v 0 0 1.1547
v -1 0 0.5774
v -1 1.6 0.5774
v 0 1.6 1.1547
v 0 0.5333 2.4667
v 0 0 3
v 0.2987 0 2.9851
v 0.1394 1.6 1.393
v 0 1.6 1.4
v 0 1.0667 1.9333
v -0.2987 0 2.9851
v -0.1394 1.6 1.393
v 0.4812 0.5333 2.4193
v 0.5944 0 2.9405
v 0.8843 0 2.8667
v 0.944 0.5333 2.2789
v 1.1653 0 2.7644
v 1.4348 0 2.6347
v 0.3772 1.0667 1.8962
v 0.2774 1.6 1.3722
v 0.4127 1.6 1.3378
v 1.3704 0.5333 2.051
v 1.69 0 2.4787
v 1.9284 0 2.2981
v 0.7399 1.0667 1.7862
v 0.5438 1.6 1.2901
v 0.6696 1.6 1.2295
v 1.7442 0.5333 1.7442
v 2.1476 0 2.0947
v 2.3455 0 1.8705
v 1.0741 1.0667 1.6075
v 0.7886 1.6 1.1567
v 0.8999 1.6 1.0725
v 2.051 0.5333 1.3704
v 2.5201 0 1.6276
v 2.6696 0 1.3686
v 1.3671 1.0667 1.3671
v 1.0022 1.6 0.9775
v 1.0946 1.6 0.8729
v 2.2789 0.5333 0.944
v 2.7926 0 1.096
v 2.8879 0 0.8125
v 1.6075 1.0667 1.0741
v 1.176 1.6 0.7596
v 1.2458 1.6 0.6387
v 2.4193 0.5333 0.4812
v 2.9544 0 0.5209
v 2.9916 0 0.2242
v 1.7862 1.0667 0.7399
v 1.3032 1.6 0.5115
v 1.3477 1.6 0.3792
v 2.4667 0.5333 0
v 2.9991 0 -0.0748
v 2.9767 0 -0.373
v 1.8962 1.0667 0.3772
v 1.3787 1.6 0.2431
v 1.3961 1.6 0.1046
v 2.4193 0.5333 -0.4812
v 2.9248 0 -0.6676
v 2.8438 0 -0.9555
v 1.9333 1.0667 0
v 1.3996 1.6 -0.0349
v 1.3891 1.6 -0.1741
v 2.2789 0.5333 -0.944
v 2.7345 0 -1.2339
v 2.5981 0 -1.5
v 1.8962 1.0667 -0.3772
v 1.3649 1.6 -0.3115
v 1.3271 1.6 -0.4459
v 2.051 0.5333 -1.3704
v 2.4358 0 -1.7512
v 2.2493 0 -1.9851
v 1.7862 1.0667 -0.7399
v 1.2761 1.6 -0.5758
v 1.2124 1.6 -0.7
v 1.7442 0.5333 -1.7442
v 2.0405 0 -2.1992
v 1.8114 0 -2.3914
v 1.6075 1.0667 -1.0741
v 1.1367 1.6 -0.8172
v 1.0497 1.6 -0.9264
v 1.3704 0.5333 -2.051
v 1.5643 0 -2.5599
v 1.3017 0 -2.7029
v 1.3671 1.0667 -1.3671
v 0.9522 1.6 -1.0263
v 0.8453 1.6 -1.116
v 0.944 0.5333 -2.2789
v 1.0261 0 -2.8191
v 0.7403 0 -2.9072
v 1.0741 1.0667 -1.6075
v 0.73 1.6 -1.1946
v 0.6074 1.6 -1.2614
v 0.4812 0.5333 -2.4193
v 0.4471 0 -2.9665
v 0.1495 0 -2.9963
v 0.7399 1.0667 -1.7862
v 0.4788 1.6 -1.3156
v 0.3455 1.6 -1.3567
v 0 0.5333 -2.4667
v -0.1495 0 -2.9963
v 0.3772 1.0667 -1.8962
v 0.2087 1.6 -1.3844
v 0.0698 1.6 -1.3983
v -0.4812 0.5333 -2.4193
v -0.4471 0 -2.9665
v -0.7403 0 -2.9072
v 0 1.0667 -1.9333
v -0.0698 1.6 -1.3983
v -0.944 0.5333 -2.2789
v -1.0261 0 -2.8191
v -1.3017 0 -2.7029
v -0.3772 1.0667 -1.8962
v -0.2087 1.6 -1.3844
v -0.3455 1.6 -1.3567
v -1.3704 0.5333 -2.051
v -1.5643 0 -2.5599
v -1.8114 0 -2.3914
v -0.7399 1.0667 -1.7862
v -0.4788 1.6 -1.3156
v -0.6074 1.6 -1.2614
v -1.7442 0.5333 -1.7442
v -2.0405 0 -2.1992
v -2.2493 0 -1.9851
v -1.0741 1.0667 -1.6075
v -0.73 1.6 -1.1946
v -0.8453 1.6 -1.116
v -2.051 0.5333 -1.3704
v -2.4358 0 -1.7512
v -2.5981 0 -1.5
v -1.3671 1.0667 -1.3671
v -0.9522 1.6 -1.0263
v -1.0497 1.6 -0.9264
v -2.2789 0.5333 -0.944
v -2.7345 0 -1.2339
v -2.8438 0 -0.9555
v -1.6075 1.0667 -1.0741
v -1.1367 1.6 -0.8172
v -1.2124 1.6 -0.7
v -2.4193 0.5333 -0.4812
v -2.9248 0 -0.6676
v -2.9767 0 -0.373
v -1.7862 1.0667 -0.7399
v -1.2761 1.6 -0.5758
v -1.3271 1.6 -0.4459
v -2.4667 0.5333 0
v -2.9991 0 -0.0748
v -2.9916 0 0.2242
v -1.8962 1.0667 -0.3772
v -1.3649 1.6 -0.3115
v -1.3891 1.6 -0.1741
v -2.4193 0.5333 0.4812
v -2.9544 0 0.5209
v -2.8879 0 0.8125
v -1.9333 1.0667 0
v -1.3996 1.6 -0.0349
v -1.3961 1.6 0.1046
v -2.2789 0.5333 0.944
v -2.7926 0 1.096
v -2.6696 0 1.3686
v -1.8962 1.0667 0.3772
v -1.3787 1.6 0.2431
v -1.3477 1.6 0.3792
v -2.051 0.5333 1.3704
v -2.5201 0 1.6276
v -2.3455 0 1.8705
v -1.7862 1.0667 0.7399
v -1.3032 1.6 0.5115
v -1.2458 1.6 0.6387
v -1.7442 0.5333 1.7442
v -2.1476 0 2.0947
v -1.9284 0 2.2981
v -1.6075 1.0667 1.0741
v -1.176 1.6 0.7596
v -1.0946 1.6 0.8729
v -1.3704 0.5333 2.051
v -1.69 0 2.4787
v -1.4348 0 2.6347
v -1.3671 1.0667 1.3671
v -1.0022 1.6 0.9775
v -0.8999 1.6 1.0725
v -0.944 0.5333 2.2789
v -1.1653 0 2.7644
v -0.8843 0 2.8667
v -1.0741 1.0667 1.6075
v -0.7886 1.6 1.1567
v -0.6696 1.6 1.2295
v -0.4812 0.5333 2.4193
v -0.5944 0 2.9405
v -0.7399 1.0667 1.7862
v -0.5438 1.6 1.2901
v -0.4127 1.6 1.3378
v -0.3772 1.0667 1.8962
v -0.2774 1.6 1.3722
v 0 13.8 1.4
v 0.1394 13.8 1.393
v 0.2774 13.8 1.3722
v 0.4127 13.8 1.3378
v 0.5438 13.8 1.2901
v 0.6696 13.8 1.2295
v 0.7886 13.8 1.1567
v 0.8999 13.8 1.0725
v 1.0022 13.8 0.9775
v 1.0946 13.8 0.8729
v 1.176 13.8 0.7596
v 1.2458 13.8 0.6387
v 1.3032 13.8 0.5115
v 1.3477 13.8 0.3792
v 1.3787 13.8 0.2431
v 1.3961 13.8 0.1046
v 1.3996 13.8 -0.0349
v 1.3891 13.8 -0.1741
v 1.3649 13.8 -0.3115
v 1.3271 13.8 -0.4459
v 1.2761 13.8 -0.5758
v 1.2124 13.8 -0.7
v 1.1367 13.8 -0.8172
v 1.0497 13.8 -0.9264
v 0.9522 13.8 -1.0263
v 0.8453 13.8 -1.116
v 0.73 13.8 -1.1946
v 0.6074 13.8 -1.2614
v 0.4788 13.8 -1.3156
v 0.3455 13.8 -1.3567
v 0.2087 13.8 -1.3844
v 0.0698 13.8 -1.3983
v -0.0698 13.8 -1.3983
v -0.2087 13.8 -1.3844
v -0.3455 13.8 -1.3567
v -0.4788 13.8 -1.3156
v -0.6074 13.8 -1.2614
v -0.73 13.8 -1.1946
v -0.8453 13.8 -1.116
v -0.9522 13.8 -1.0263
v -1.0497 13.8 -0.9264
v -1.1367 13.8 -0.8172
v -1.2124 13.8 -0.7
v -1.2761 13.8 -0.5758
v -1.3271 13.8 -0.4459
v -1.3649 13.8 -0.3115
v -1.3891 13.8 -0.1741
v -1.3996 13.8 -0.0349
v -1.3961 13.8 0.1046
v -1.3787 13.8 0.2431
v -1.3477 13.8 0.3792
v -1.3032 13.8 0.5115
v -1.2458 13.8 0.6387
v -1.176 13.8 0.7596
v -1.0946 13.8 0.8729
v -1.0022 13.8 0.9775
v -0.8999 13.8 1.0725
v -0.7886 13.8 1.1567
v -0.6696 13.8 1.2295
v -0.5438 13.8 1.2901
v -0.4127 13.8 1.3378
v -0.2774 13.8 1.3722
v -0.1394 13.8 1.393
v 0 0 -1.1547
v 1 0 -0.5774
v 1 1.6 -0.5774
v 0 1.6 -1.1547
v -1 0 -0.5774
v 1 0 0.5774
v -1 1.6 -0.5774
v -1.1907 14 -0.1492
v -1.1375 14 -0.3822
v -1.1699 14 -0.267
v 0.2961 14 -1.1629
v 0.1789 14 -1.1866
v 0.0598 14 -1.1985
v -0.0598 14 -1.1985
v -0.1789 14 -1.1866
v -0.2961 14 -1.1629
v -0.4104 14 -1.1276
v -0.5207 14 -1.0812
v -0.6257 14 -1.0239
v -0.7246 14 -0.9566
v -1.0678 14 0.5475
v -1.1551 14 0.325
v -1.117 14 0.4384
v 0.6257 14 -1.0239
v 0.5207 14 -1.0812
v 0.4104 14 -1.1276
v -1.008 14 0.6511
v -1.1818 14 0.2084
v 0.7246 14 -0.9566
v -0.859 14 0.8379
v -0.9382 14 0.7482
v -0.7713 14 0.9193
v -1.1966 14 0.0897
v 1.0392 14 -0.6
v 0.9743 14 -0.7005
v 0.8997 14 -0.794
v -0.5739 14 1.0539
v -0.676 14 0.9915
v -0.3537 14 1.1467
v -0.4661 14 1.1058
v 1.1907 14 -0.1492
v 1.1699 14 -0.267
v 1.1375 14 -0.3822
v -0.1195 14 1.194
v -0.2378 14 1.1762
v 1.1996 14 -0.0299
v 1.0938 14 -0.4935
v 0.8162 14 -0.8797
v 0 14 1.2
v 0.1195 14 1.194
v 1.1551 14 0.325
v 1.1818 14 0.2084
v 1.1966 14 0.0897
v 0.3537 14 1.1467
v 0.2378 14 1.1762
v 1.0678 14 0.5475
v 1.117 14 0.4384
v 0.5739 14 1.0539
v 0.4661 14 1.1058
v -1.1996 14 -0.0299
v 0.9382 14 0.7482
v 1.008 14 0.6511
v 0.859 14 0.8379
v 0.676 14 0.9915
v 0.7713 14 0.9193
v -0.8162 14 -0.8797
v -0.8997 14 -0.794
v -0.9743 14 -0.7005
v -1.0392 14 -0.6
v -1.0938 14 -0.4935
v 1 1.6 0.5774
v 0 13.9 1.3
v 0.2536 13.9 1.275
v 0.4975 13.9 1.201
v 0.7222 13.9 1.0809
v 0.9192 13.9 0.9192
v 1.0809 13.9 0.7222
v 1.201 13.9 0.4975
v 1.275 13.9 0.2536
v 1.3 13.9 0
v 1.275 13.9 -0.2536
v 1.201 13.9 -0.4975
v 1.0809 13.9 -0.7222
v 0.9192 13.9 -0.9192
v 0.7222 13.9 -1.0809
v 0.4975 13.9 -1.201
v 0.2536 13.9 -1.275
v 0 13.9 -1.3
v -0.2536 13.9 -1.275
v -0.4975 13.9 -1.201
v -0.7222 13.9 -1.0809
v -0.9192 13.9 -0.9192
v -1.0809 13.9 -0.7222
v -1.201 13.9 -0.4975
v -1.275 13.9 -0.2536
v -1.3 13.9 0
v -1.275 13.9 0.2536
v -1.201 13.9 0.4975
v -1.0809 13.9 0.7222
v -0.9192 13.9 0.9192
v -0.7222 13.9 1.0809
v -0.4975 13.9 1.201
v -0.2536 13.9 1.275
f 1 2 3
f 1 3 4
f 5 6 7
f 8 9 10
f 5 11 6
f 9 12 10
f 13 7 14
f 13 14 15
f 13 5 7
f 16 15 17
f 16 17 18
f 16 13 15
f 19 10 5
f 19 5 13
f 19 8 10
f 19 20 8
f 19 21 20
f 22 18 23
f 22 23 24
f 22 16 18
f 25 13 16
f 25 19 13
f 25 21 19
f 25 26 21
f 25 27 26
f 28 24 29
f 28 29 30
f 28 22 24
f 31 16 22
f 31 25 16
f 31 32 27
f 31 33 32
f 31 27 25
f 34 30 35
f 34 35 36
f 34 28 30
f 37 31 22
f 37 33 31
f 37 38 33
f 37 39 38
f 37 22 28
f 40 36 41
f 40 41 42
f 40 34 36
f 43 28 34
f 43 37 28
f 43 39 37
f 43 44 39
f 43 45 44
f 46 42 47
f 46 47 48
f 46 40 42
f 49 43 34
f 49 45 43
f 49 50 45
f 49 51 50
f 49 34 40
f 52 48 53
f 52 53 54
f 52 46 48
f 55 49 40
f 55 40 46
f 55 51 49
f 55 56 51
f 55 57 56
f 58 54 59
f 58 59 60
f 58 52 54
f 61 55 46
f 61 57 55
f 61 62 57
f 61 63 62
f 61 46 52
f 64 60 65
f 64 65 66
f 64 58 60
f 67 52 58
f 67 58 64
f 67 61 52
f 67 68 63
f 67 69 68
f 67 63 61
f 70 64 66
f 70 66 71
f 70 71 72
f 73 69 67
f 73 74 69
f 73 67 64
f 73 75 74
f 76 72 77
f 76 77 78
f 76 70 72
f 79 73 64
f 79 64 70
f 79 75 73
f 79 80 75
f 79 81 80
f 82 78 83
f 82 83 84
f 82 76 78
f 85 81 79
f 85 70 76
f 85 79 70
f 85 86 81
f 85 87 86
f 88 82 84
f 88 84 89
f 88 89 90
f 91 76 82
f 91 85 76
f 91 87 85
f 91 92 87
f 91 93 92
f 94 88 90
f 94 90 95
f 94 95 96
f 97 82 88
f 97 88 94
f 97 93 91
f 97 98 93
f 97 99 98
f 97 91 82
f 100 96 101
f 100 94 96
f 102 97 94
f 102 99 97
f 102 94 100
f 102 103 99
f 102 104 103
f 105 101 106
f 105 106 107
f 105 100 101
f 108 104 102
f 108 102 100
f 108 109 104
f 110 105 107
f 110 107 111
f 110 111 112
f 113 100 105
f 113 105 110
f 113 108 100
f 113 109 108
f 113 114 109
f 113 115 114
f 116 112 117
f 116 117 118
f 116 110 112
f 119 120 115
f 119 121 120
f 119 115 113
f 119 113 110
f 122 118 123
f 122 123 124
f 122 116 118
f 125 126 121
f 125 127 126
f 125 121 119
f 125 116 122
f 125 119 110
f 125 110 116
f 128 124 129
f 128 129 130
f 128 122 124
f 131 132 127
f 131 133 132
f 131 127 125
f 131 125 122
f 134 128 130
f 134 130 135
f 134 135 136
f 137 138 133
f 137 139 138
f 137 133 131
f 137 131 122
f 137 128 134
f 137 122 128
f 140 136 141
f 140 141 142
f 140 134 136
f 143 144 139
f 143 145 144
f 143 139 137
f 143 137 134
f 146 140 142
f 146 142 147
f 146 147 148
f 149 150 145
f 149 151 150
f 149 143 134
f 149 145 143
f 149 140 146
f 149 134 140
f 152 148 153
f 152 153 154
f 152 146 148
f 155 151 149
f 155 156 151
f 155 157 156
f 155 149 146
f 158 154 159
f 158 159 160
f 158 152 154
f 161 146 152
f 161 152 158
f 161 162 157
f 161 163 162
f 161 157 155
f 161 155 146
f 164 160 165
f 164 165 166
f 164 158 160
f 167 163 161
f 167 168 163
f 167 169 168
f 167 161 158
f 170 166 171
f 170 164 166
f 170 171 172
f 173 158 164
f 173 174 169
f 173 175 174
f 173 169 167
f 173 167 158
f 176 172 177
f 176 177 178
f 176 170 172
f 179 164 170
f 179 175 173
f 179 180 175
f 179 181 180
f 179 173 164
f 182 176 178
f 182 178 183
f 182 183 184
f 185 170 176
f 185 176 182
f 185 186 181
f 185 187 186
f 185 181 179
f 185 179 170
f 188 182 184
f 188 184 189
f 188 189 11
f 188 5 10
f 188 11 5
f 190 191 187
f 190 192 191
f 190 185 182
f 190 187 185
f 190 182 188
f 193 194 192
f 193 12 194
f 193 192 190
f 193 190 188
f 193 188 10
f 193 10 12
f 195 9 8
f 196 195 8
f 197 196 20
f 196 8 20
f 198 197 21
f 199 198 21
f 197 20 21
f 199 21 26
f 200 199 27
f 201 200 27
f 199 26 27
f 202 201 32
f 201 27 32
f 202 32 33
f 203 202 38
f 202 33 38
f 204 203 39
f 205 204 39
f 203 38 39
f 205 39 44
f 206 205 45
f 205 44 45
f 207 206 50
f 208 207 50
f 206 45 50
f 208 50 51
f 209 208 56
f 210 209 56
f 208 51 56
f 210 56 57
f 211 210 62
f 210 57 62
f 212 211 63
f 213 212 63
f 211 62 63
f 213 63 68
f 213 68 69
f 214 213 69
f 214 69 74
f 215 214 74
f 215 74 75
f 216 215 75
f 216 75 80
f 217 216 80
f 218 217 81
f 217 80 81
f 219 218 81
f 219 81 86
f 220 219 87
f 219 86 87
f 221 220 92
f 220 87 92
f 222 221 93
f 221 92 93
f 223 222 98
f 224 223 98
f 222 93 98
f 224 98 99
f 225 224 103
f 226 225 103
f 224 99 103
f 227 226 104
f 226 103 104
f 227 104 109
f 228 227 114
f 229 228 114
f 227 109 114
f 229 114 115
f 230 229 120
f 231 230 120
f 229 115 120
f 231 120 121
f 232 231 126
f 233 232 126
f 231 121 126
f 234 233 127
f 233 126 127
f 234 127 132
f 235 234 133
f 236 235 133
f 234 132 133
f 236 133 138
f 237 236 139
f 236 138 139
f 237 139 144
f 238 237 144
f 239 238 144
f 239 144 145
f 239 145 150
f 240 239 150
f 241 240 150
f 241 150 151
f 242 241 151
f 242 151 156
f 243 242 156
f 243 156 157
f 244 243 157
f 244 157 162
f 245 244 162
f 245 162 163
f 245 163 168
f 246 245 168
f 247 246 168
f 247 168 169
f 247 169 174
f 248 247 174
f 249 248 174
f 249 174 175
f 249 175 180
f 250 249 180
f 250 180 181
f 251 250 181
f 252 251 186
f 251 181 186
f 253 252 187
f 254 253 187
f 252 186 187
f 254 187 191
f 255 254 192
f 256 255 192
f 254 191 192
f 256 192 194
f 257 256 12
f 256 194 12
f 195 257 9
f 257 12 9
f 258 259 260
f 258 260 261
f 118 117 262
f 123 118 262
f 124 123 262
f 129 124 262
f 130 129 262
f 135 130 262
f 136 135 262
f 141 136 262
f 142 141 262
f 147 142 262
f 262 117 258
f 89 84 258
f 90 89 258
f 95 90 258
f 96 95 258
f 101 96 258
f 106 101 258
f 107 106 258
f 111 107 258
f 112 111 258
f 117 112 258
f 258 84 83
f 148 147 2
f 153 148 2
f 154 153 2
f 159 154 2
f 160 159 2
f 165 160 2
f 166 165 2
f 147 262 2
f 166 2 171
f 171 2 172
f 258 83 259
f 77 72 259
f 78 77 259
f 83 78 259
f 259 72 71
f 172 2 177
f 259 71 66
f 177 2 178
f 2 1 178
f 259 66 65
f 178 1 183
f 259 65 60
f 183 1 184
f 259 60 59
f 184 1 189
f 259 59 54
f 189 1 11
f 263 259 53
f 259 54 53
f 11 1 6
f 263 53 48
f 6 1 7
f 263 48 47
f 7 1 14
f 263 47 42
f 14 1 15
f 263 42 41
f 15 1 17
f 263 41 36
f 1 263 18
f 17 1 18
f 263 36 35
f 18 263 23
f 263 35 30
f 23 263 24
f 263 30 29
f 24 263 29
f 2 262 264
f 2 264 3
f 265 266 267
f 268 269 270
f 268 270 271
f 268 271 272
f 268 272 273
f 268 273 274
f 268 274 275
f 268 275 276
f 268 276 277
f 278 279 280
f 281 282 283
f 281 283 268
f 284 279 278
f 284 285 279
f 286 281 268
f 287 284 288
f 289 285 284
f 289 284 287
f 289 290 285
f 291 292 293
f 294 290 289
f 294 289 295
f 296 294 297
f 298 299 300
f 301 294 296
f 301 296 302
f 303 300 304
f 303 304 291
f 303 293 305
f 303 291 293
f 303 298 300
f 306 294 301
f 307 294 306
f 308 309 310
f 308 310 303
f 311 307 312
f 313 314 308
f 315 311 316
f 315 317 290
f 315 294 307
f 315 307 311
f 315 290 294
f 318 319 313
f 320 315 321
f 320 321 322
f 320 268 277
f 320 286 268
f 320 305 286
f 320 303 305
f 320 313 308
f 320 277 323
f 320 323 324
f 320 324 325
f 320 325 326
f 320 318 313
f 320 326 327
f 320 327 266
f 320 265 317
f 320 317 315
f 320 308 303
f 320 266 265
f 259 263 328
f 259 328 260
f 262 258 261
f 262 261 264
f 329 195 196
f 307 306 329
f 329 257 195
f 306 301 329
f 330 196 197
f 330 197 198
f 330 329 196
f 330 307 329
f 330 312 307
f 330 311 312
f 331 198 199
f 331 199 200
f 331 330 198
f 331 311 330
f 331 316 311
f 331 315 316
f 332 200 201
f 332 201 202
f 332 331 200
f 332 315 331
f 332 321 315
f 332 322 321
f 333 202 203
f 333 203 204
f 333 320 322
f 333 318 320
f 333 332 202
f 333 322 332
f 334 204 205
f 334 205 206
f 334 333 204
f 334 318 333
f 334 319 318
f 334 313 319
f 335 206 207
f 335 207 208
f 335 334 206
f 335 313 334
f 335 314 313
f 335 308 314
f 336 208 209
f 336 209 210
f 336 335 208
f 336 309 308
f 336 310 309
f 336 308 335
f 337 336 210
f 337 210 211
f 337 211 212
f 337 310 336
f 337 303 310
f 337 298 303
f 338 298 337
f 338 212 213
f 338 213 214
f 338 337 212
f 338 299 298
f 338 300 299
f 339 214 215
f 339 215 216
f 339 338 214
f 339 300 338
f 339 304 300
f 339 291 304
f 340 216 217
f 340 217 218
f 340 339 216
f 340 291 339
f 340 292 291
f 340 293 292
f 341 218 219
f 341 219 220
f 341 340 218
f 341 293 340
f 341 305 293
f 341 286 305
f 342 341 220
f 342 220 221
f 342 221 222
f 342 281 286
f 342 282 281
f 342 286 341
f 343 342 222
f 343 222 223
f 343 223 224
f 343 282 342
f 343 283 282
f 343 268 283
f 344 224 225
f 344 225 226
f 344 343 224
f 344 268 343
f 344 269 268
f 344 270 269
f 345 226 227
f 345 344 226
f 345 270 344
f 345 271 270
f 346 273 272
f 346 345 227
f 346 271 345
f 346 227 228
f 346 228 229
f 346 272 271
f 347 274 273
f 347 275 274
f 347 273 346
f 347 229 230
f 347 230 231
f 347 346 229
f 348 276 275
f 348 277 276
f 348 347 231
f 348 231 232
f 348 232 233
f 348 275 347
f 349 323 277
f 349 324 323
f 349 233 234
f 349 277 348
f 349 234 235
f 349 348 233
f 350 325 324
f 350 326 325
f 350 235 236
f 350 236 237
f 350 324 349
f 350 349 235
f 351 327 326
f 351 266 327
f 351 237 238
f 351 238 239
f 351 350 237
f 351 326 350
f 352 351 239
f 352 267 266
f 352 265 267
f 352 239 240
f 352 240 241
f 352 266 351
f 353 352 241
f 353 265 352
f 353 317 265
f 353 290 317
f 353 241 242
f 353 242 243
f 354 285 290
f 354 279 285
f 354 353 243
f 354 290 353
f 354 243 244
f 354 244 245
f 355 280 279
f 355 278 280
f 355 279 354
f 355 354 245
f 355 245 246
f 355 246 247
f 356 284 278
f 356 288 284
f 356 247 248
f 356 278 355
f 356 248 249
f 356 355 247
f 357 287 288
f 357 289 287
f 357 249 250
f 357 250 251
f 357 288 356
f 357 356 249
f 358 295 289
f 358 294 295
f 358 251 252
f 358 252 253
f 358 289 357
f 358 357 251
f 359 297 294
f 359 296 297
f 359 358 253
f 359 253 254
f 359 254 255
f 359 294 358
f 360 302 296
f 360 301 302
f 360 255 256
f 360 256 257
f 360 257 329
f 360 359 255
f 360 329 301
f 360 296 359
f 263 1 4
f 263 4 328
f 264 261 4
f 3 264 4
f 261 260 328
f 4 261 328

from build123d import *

# Parameters (mm, degrees)
SKETCH_1_R      = 3
EXTRUDE_1_DEPTH = 1.6
CHAMFER_1_SIZE  = 1.6
SKETCH_2_R      = 1.4
EXTRUDE_2_DEPTH = 12.4
CHAMFER_2_SIZE  = 0.2


with BuildPart() as part:
    # 草图1 → 凸台-拉伸1 (new body)
    with BuildSketch(Plane(origin=(0, 0, 0), x_dir=(1, 0, 0), z_dir=(0, 1, 0))):
        with Locations(Location((0, 0, 0), (0, 0, 270))):
            Circle(SKETCH_1_R)
        Polygon((0, -1.154700538), (1, -0.577350269), (1, 0.577350269), (0, 1.154700538), (-1, 0.577350269), (-1, -0.577350269), align=None, mode=Mode.SUBTRACT)
    extrude(amount=EXTRUDE_1_DEPTH)

    # 倒角1
    # the kernel refuses this chamfer: 1.6 mm, written as the material it takes off along each edge
    with BuildSketch(Plane(origin=(0, 1.6, 0), x_dir=(0, 0, 1), z_dir=(-1, 0, 0))) as chamfer_1_piece_1:
        Polygon((3, -CHAMFER_1_SIZE), (3 - CHAMFER_1_SIZE, 0), (3, 0), align=None)
    revolve(axis=Axis((0, 1.6, 0), (0, 1, 0)), mode=Mode.SUBTRACT)

    # 草图2 → 凸台-拉伸2 (add)
    with BuildSketch(Plane(origin=(0, 1.6, 0), x_dir=(1, 0, 0), z_dir=(0, 1, 0))):
        with Locations(Location((0, 0, 0), (0, 0, 270))):
            Circle(SKETCH_2_R)
    extrude(amount=EXTRUDE_2_DEPTH)

    # 倒角2
    chamfer_2_edges = [part.edges().sort_by_distance(p)[0] for p in [
        (0, 14, -1.4),
    ]]
    chamfer(chamfer_2_edges, length=CHAMFER_2_SIZE)


solid = part.part
